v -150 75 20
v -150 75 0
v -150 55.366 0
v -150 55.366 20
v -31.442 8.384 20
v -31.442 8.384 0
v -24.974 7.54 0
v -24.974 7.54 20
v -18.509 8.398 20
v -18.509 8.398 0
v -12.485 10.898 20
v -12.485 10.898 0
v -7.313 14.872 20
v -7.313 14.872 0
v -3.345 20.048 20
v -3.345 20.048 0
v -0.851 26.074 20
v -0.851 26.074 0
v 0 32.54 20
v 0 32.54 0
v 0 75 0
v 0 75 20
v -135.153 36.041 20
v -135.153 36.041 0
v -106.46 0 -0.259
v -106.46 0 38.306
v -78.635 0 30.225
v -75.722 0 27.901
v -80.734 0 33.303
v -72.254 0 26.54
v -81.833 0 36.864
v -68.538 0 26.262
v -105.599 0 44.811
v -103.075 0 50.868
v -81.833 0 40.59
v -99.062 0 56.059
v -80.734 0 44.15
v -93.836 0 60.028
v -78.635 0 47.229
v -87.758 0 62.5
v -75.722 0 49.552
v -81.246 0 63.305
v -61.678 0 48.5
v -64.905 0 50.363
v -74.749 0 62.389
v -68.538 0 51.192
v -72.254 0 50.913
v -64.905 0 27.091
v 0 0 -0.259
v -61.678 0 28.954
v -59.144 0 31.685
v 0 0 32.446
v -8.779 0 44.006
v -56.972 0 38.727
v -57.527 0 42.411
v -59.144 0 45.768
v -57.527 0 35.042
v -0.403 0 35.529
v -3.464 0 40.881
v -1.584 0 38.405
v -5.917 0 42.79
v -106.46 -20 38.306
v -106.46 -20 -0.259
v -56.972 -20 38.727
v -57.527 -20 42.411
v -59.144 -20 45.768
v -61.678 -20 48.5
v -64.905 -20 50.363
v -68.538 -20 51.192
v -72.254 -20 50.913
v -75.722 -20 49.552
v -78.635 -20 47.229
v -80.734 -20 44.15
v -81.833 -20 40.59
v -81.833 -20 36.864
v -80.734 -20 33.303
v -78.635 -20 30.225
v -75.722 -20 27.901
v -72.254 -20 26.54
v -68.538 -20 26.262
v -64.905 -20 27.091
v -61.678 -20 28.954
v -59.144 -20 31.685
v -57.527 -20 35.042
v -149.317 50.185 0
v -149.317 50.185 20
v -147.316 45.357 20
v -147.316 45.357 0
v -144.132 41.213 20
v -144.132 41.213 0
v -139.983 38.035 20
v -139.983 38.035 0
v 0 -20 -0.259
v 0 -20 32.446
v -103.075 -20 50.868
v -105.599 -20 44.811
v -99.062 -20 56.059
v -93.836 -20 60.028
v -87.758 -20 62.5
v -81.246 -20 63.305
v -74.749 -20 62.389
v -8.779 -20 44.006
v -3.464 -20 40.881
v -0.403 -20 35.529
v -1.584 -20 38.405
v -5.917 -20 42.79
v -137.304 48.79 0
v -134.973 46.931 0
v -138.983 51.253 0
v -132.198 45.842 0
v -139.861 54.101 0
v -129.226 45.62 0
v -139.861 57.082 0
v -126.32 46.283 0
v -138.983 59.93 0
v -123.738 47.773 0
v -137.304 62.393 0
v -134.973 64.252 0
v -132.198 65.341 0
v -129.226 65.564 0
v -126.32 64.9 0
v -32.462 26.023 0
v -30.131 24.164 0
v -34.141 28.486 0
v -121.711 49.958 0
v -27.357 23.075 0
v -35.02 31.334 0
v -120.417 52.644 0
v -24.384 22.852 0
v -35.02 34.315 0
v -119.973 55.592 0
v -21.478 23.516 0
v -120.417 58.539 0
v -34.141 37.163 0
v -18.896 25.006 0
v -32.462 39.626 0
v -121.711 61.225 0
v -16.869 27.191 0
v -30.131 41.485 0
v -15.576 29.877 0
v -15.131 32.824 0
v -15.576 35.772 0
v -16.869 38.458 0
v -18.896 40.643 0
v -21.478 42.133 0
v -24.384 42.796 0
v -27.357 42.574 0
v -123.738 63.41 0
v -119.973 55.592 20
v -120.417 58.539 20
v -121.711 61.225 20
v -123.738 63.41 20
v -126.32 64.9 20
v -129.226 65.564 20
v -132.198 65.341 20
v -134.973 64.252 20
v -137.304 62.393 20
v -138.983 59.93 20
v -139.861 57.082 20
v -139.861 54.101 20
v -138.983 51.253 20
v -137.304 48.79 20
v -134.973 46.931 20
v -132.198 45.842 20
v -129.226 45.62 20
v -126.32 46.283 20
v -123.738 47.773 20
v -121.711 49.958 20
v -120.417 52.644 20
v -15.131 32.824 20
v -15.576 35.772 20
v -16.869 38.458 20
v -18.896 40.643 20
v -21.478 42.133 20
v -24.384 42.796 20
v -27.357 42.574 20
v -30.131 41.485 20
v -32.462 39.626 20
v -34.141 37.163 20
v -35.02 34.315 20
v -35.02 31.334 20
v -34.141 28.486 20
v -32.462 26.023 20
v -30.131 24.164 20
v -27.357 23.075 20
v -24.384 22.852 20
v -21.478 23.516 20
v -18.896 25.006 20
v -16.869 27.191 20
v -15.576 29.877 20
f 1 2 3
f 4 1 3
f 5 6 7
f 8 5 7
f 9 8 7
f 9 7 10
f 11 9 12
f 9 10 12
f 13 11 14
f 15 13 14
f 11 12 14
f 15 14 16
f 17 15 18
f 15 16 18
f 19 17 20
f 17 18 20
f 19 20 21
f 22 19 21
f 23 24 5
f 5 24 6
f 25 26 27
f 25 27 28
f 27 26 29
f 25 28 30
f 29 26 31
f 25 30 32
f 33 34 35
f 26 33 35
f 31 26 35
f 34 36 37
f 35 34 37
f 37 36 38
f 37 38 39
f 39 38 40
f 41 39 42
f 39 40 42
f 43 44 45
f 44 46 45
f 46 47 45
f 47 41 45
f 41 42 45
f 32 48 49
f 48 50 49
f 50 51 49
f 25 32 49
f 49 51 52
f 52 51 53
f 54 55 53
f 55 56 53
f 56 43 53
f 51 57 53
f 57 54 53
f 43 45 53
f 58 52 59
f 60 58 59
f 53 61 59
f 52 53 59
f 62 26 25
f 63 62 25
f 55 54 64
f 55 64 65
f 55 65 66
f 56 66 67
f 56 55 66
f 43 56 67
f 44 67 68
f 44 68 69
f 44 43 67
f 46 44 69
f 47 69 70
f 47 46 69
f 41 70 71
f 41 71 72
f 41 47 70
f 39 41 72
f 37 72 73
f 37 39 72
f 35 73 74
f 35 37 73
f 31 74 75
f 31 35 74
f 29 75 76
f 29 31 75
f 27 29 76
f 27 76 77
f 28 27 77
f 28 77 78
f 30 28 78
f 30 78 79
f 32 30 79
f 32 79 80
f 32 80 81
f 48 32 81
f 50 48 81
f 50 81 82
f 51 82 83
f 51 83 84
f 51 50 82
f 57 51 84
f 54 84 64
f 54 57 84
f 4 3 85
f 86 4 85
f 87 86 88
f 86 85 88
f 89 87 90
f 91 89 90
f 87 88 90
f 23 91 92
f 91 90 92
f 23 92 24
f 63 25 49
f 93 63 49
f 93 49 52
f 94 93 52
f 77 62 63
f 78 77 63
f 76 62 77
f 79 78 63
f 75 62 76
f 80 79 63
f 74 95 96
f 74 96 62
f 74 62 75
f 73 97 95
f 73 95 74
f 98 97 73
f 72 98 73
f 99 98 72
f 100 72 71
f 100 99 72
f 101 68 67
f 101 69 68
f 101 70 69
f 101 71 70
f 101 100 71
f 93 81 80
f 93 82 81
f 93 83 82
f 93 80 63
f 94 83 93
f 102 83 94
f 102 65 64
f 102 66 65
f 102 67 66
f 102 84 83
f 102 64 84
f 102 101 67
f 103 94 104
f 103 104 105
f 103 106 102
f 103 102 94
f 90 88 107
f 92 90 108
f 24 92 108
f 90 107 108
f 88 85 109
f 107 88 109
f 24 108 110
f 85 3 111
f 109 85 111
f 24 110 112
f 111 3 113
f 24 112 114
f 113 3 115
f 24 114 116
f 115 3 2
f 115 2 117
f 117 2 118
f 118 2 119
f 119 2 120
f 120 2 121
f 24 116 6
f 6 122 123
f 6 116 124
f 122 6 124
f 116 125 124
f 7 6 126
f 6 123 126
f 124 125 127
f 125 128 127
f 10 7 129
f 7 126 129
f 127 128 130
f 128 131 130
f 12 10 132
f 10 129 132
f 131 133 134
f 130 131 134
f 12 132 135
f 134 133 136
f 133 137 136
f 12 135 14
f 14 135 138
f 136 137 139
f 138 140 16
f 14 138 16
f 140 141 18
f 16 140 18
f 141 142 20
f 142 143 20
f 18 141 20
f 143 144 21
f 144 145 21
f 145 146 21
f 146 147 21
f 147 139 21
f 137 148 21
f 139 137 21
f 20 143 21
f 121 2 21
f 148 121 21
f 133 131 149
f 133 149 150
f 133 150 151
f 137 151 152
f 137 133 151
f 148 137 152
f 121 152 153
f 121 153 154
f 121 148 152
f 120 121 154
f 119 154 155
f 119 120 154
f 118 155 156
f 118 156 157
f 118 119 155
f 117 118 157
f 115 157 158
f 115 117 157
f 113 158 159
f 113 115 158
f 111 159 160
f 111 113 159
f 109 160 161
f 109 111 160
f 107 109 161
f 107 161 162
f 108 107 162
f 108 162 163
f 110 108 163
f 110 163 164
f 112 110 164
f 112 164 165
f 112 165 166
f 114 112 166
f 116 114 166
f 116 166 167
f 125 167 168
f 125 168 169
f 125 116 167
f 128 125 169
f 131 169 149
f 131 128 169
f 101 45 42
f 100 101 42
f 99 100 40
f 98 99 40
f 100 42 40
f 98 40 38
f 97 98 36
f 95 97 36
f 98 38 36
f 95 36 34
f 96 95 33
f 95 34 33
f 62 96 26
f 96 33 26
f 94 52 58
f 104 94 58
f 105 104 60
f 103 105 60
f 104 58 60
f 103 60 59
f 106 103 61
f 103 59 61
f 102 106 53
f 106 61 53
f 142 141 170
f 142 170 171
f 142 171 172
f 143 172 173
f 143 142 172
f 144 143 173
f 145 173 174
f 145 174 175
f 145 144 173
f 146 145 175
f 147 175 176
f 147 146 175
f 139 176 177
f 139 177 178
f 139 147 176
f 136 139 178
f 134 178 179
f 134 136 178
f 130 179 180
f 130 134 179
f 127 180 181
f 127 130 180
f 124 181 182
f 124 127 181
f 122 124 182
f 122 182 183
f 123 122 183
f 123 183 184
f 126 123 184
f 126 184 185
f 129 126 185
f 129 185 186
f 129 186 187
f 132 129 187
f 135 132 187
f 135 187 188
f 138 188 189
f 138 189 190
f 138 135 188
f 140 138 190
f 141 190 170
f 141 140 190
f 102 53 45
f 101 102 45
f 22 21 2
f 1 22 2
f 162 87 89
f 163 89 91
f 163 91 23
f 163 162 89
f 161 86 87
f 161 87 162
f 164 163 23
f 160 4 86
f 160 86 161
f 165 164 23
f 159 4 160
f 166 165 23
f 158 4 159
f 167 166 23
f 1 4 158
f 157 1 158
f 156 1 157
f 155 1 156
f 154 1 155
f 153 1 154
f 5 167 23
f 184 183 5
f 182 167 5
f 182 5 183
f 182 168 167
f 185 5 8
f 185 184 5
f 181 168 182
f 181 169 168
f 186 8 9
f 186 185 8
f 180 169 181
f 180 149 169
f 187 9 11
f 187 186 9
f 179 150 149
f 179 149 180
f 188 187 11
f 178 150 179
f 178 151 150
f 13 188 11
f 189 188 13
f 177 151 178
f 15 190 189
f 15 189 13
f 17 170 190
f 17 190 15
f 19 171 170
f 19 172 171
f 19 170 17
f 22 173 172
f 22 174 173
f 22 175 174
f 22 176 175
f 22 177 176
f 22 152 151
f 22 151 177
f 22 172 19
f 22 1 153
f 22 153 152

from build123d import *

# Parameters (mm, degrees)
F0_R     = 10
F1_DEPTH = 20
F2_R     = 12.5
F3_DEPTH = 20


with BuildPart() as f1:
    # F0 (on Top) → F1 (new body)
    with BuildSketch(Plane.XY):
        with BuildLine():
            Line((0, 75), (-150, 75))
            Line((-150, 75), (-150, 55.365566))
            ThreePointArc((-150, 55.365566), (-145.859777, 43.180843), (-135.153253, 36.040867))
            Line((-135.153253, 36.040867), (-31.441566, 8.384418))
            ThreePointArc((-31.441566, 8.384418), (-9.769096, 12.71557), (0, 32.540291))
            Line((0, 32.540291), (0, 75))
        make_face()
        with Locations((-25.131382, 32.824382)):
            Circle(F0_R, mode=Mode.SUBTRACT)
        with Locations((-129.973069, 55.591617)):
            Circle(F0_R, mode=Mode.SUBTRACT)
    extrude(amount=F1_DEPTH)


with BuildPart() as f3:
    # F2 (on Front) → F3 (new body)
    with BuildSketch(Plane.XZ):
        with BuildLine():
            Line((-106.459646, -0.25874), (0, -0.25874))
            Line((0, -0.25874), (0, 32.446328))
            ThreePointArc((0, 32.446328), (-2.443489, 39.703951), (-8.778849, 44.005921))
            Line((-8.778849, 44.005921), (-74.748914, 62.388884))
            ThreePointArc((-74.748914, 62.388884), (-96.579694, 58.215798), (-106.459646, 38.306399))
            Line((-106.459646, 38.306399), (-106.459646, -0.25874))
        make_face()
        with Locations((-69.472119, 38.726732)):
            Circle(F2_R, mode=Mode.SUBTRACT)
    extrude(amount=F3_DEPTH)


solid = Compound([f1.part, f3.part])
